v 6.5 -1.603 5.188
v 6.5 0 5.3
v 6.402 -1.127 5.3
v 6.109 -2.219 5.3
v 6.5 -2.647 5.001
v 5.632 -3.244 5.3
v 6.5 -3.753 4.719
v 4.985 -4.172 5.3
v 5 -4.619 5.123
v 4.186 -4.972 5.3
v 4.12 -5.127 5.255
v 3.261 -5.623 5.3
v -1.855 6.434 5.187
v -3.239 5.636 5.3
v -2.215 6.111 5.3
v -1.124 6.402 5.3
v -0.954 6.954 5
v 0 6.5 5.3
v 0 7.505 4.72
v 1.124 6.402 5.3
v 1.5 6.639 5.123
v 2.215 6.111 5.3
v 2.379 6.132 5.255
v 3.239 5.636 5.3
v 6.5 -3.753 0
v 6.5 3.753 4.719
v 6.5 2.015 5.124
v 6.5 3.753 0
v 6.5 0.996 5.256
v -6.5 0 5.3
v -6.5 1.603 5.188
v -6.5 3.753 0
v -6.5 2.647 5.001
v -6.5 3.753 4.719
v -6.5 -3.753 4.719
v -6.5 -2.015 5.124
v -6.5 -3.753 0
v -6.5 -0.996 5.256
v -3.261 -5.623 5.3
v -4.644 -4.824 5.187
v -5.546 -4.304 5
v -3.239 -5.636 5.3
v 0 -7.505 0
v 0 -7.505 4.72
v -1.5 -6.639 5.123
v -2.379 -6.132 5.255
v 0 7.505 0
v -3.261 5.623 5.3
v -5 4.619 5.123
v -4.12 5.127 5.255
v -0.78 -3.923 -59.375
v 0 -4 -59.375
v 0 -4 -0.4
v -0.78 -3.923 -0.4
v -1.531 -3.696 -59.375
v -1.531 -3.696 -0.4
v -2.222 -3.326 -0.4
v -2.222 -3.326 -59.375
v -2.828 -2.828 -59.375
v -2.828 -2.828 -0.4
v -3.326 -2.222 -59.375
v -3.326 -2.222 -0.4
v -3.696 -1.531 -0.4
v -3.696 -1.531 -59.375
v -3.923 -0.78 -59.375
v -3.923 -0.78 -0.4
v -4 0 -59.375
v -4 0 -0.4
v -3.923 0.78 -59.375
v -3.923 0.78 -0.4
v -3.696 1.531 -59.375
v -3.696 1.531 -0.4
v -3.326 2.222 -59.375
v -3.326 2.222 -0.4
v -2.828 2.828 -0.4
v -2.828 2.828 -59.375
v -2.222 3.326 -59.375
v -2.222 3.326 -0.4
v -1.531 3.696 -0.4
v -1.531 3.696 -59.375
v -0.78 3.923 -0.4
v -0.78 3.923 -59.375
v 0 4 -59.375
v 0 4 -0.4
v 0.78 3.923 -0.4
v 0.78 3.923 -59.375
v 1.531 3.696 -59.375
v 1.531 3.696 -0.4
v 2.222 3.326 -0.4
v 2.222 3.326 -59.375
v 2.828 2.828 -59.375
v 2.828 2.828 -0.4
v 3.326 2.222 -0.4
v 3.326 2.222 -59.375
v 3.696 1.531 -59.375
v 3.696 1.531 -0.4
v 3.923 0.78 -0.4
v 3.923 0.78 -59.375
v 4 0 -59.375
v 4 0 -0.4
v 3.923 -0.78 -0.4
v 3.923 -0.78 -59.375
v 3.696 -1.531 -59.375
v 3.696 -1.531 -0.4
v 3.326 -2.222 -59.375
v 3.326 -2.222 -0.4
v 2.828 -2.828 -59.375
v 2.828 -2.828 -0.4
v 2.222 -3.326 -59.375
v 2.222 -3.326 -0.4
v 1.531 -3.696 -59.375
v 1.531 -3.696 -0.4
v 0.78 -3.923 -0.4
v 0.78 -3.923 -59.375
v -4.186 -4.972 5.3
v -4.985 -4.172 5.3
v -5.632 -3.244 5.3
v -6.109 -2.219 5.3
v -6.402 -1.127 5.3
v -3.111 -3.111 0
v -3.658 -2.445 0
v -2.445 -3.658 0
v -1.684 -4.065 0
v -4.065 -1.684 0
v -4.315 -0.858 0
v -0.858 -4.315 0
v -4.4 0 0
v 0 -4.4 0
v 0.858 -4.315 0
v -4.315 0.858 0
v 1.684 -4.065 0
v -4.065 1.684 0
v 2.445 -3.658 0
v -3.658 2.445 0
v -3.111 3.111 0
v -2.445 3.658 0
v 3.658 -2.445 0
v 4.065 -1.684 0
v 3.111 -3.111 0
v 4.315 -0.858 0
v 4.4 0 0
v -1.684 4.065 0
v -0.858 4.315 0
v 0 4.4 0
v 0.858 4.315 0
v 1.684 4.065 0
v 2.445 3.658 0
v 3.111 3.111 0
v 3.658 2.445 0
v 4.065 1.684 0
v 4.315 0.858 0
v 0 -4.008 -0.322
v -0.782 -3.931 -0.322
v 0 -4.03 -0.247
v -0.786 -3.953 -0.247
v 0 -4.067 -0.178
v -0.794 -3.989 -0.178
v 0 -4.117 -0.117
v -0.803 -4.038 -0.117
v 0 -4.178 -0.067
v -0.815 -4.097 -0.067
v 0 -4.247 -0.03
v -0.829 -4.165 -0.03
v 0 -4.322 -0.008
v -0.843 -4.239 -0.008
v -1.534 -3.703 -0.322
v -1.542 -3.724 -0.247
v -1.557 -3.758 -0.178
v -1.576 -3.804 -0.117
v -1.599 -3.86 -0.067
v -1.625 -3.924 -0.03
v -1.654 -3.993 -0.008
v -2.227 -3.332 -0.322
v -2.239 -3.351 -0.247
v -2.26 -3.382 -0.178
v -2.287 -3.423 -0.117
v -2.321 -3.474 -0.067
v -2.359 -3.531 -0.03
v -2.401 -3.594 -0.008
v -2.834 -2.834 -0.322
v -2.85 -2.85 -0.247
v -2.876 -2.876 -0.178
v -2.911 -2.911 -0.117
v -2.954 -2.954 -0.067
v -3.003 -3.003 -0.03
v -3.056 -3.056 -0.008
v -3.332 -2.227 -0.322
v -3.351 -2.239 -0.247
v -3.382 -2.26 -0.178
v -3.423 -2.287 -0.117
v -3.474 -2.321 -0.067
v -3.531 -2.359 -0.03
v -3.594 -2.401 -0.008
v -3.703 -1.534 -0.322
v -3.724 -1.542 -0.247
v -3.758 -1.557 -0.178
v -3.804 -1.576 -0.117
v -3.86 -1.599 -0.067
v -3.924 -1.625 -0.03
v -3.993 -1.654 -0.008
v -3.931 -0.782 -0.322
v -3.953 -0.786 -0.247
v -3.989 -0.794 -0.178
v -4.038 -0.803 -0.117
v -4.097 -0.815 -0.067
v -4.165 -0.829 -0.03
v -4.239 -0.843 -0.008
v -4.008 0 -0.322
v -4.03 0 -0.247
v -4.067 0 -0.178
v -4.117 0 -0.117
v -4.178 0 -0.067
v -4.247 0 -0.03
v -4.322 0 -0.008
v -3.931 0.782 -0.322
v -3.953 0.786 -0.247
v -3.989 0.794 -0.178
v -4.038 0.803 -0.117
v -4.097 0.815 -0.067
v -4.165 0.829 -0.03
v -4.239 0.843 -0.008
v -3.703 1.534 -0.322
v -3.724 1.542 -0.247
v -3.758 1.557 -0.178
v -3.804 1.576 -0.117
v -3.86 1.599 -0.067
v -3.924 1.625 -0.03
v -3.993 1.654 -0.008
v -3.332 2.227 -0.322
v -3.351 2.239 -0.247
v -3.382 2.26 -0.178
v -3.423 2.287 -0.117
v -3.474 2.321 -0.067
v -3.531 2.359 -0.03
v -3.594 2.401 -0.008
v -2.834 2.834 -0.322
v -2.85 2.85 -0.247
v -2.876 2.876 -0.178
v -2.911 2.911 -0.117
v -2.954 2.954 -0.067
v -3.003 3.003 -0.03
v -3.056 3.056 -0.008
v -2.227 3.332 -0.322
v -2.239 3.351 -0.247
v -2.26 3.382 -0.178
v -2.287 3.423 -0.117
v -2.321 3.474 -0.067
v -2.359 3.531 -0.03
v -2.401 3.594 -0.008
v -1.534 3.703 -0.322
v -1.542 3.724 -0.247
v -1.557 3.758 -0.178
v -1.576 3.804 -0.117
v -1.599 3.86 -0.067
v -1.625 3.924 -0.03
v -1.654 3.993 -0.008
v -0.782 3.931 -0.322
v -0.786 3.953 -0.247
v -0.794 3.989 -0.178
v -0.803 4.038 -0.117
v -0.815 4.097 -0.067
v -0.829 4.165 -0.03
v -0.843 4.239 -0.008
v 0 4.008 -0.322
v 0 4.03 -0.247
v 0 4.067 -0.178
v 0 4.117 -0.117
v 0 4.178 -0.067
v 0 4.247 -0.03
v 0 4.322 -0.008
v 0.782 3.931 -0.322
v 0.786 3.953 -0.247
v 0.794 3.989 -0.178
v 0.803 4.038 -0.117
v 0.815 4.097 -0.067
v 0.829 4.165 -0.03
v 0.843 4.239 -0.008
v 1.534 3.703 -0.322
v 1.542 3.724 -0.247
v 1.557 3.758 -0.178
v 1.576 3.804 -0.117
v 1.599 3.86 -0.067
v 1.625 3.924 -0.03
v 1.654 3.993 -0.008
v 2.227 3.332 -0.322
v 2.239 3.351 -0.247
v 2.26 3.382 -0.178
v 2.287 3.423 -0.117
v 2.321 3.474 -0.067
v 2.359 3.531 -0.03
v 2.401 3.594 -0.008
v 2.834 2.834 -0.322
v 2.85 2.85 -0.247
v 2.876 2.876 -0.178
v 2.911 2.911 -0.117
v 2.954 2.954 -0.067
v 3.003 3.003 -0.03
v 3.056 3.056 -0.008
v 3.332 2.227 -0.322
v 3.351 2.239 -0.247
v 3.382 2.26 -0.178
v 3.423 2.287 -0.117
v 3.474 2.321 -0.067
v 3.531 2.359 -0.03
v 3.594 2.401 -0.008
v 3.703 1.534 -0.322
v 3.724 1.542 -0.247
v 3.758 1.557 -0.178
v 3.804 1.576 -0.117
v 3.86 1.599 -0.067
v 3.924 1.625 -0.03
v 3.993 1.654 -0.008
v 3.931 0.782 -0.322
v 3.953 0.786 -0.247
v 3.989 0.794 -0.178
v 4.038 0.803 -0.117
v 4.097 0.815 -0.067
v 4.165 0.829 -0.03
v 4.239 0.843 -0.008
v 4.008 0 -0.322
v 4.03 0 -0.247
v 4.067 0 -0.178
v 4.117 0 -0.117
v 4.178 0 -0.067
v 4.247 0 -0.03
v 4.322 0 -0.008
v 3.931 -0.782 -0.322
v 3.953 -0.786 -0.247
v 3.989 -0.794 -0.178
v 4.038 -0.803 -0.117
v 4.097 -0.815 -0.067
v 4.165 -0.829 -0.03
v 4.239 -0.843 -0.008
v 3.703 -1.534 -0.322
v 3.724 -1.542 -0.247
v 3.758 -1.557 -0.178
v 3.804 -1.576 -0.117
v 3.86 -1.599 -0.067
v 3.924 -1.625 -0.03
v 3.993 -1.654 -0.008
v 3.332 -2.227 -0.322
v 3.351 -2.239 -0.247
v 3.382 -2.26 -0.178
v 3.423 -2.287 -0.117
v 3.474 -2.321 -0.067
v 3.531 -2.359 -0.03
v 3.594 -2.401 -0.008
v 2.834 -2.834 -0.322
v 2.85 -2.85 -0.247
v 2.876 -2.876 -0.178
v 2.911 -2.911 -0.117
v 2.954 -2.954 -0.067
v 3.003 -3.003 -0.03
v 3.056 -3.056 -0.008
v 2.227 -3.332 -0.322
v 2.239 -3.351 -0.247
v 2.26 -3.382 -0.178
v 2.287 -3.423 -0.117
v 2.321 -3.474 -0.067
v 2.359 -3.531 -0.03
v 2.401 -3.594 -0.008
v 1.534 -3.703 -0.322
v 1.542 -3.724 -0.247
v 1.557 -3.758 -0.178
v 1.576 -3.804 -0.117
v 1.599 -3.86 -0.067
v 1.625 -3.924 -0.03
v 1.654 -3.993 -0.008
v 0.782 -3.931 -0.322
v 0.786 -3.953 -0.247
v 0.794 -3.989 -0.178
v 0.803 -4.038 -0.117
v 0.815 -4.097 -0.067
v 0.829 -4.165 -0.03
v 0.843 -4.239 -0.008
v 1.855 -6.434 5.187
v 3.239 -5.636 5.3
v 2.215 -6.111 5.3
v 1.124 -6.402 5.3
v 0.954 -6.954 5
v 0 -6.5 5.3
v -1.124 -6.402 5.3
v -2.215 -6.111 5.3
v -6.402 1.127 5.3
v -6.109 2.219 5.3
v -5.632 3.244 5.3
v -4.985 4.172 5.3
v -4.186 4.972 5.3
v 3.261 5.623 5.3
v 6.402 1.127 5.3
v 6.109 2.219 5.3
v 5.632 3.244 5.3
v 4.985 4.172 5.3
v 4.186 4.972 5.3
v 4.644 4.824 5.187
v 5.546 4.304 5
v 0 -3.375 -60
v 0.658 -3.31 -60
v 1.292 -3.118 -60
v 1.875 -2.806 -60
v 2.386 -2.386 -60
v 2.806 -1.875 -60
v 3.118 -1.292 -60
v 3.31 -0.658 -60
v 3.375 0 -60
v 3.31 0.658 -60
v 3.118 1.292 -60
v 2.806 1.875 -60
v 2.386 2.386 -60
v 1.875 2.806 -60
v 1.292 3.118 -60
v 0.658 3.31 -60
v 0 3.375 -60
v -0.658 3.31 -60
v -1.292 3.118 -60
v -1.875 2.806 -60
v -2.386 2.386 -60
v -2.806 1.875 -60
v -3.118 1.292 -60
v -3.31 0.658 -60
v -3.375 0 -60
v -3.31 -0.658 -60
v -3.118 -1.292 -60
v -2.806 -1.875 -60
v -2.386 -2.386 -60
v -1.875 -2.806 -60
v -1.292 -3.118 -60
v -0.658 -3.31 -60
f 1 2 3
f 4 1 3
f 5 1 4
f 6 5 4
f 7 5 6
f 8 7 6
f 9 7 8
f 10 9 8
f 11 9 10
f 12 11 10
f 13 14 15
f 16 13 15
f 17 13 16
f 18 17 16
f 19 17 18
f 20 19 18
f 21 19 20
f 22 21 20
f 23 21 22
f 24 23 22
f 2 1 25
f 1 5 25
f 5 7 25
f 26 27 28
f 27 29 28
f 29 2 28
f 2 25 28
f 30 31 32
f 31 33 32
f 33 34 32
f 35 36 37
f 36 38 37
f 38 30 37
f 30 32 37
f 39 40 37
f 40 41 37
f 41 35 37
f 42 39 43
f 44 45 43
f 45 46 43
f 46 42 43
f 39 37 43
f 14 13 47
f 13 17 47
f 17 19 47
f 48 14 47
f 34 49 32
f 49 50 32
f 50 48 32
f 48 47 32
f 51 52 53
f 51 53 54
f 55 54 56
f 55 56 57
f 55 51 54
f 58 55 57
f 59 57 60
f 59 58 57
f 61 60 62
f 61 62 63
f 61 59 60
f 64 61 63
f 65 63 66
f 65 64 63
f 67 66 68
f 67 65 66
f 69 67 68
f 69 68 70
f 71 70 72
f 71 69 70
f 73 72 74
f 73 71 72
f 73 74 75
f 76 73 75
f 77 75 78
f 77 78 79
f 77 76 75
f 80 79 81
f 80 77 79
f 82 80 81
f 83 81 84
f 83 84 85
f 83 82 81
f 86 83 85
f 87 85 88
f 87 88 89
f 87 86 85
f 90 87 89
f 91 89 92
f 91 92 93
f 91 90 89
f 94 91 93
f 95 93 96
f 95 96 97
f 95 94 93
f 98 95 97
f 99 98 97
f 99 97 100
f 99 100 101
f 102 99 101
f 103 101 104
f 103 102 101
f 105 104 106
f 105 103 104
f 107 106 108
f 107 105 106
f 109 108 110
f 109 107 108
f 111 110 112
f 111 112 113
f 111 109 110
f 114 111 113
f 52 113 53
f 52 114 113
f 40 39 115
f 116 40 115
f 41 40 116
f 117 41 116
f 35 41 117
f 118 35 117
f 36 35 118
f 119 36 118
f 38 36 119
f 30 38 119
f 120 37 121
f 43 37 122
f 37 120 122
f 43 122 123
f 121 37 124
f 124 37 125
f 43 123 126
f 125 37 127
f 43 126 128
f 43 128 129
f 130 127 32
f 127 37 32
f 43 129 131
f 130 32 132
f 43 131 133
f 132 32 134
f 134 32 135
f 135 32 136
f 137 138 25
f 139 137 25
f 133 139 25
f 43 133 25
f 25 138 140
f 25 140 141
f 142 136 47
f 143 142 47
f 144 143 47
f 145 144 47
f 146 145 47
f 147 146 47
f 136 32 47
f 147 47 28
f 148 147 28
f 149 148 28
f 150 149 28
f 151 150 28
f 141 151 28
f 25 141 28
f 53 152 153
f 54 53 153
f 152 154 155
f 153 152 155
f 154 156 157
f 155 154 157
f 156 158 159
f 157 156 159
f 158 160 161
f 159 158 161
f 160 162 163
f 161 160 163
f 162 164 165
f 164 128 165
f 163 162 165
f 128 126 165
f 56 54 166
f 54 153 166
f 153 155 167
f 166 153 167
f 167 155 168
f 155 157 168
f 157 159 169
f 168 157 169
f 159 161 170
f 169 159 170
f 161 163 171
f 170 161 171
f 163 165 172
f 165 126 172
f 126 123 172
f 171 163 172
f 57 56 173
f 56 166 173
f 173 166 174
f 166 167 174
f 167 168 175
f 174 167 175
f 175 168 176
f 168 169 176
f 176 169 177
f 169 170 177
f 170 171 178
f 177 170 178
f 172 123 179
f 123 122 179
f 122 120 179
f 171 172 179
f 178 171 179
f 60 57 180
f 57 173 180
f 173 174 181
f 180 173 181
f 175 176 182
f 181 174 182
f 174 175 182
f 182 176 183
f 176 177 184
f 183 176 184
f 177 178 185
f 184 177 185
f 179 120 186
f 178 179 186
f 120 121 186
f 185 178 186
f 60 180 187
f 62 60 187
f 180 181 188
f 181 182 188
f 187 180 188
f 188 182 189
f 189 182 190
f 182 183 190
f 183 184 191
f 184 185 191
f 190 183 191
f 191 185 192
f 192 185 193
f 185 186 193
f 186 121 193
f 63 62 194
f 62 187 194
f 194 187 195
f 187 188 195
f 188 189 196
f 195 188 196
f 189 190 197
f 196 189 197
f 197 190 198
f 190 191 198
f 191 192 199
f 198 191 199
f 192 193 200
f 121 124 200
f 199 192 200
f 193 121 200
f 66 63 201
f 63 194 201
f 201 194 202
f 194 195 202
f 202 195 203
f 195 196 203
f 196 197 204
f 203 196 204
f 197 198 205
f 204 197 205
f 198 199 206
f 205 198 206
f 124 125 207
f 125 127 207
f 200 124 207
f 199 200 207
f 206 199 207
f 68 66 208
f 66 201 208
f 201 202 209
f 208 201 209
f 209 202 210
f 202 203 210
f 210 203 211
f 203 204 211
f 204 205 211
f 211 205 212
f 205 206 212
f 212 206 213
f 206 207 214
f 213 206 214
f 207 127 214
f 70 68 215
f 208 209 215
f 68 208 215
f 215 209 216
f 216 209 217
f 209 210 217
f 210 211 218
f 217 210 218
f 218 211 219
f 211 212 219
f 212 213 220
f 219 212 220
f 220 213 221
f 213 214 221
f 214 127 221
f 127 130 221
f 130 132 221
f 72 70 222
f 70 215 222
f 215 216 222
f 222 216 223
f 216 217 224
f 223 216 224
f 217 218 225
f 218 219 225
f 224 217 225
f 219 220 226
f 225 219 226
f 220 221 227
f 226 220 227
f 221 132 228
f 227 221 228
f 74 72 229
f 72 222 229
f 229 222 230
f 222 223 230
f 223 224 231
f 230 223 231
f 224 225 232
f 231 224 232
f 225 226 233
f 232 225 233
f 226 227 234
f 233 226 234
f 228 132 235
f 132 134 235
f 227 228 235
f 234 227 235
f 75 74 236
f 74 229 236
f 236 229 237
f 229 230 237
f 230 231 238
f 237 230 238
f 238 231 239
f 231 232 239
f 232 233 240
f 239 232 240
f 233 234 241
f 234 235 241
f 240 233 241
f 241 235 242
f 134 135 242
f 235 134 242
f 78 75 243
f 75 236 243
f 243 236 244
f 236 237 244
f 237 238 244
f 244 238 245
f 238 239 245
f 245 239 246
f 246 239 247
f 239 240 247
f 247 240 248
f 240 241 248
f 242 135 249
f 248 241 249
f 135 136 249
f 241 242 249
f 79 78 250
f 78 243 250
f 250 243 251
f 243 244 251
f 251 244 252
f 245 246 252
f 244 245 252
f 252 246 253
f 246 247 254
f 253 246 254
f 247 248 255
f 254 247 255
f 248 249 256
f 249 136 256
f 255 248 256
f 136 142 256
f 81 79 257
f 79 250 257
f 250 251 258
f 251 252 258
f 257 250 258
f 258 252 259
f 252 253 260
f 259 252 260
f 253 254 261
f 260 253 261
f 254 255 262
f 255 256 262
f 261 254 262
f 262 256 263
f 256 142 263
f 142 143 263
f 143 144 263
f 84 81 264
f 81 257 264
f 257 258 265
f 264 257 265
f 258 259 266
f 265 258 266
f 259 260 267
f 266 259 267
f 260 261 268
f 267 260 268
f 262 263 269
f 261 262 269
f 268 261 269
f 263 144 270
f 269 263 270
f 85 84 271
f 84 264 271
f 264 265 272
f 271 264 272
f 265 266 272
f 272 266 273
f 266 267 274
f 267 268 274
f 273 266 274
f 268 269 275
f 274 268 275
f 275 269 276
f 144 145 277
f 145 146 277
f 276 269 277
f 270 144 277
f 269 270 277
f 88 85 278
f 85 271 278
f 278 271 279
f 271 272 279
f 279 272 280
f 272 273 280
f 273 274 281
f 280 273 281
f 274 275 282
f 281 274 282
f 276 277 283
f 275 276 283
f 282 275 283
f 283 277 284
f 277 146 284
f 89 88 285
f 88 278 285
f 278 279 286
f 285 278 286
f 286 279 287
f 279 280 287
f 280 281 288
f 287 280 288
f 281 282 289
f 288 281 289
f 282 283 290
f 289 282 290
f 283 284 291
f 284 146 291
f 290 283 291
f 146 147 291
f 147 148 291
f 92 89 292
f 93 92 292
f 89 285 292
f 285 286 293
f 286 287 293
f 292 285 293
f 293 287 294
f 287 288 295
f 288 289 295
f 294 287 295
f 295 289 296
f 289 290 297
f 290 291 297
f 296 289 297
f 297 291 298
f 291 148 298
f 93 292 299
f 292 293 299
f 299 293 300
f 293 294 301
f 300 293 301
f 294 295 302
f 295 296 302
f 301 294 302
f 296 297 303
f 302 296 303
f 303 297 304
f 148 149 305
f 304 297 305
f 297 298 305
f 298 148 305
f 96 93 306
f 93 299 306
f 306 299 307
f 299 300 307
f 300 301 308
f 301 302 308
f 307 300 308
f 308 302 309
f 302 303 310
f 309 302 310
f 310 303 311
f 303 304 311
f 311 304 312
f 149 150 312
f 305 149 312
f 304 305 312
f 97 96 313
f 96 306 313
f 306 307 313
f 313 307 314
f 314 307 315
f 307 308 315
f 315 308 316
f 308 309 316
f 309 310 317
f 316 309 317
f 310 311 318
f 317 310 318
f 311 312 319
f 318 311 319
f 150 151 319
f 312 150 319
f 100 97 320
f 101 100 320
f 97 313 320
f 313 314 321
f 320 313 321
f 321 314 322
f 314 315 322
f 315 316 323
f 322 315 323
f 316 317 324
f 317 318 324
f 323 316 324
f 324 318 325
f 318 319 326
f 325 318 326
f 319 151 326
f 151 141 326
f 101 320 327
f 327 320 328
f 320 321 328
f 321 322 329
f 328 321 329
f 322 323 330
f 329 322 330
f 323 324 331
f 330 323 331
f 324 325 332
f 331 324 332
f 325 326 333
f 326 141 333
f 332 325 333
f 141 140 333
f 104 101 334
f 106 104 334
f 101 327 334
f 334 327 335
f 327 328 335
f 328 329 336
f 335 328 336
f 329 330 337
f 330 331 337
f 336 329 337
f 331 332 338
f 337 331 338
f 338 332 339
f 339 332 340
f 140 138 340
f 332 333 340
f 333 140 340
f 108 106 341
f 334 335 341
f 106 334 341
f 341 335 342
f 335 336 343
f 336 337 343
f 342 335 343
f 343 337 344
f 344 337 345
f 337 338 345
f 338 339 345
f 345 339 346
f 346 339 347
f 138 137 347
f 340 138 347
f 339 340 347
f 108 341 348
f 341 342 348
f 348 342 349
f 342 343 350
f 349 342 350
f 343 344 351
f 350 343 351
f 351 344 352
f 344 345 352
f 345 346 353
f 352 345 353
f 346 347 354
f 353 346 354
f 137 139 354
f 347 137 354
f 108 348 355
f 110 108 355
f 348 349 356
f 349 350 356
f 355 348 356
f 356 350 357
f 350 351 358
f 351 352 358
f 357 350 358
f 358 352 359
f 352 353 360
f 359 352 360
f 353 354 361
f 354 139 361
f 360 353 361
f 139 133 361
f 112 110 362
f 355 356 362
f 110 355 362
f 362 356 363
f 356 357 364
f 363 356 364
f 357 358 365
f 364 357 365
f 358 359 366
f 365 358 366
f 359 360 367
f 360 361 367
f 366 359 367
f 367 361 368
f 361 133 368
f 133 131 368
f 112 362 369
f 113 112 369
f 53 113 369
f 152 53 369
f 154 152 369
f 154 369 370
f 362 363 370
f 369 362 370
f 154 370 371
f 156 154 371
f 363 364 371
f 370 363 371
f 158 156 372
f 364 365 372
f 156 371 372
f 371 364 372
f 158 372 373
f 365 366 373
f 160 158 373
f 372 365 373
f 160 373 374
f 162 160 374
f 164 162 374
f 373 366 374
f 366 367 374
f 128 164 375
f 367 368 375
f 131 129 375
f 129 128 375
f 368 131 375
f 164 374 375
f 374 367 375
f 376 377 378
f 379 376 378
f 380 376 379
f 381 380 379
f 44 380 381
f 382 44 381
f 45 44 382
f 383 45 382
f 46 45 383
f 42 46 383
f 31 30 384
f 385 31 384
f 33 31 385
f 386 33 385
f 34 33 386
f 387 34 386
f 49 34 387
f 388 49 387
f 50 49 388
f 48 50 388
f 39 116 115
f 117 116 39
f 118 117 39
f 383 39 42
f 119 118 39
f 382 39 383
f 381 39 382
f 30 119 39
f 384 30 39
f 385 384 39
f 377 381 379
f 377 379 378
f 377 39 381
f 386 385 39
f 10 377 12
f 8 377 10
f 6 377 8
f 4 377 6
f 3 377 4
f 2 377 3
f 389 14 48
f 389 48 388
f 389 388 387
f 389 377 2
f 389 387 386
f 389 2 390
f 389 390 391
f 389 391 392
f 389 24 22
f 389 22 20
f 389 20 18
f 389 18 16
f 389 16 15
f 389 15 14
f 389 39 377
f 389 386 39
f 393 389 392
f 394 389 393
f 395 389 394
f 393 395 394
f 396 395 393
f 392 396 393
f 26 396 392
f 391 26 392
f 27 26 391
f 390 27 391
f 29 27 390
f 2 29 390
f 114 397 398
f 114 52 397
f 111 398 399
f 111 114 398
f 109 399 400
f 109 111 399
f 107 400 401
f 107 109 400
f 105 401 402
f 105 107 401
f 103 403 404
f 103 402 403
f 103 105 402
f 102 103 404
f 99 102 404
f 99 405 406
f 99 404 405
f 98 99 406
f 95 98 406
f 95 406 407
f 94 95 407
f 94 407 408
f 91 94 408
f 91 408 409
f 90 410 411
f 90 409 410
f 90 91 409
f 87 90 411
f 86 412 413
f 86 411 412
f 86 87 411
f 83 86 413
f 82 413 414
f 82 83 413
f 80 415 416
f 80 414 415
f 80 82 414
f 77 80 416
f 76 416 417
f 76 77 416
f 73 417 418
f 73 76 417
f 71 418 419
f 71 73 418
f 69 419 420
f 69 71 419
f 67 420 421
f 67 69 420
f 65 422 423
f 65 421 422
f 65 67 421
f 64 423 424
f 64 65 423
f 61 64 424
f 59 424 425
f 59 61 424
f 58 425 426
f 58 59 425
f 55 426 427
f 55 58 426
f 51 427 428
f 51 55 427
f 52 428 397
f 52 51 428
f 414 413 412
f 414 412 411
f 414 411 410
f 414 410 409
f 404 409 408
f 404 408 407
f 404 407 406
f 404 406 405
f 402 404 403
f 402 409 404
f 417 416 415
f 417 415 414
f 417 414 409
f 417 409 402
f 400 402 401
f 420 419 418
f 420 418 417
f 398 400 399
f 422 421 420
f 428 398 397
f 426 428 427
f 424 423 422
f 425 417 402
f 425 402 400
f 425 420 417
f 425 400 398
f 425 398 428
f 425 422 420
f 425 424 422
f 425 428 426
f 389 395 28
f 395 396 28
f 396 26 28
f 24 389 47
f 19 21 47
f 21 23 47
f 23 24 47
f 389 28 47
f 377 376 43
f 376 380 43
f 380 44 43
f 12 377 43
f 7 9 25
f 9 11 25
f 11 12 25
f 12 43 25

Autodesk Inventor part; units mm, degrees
ref_plane "WorkPlane1" through (0, 0, 0) normal (0, 0, 1) x (1, 0, 0)
sketch "Sketch1" plane through (0, 0, 0) normal (0, 0, 1) x (1, 0, 0)
  point P0 (0, 0)
sketch "Sketch2" plane through (0, 0, 0) normal (0, 0, 1) x (1, 0, 0)
  line L0 (-6.5, 3.7529) -> (-6.5, -3.7529)
  line L1 (0, 7.5054) -> (-6.5, 3.7529)
  line L2 (6.5, 3.7529) -> (0, 7.5054)
  line L3 (6.5, -3.7529) -> (6.5, 3.7529)
  line L4 (0, -7.5054) -> (6.5, -3.7529)
  line L5 (-6.5, -3.7529) -> (0, -7.5054)
  circle A0 centre (0, 0) radius 6.5 construction
  dimension "d1" = 13
  dimension "d29" = 0
  dimension "d30" = 0
extrude "Extrusion1" add sketch "Sketch2" along normal blind 5.3
sketch "Sketch3" plane through (0, 0, 0) normal (1, 0, 0) x (0, 1, 0)
  line L0 (6.5, 5.3) -> (7.6054, 5.3)
  line L1 (7.6054, 4.6618) -> (6.5, 5.3)
  line L2 (7.6054, 5.3) -> (7.6054, 4.6618)
  line L3 (0, -1.06) -> (0, 6.36) projected
  line L4 (7.5054, 0) -> (7.5054, 5.3) projected
  dimension "d25" = 0.1
  dimension "d26" = 0
  dimension "d27" = 60
  dimension "d28" = 6.5
revolve "Revolution1" cut sketch "Sketch3" angle 360 about axis through (0, 0, -10) along (0, 0, 1)
sketch "Sketch4" plane through (0, 0, 0) normal (1, 0, 0) x (0, 1, 0)
  line L0 (0, -60) -> (0, 0)
  line L1 (-4, -60) -> (0, -60)
  line L2 (-4, 0) -> (-4, -60)
  line L3 (0, 0) -> (-4, 0)
  line L4 (0, -60) -> (0, 0)
  line L5 (-4.8, 0) -> (0.8, 0) projected
  line L6 (0, -72) -> (0, 12) projected
  dimension "d18" = 4
  dimension "d20" = 60
  dimension "d33" = 0
  dimension "d34" = 0
revolve "Revolution2" add sketch "Sketch4" angle 360 about axis through (0, 0, -60) along (0, 0, -1)
chamfer "Chamfer1" distance 0.625 angle 45 1 edges at (0, 4, -60)
fillet "Fillet1" radius 0.4 1 edges at (0, 4, 0)
thread "Thread1" size "M8x1.25" class "6g" standard "ISO Metric profile" length 57.5
ref_plane "MSC_PF1" through (0, 0, 0) normal (1, 0, 0) x (0, 1, 0)
ref_plane "MSC_PT1" through (0, 0, 0) normal (0, 0, -1) x (-1, 0, 0)
equation "\"d22\" = 0.5 * PTC"
equation "\"d23\" = 0.5 * PTC"
equation "\"d24\" = r"
equation "\"d1\" = ParS"
equation "\"d6\" = ParK"
equation "\"b\" = NLG - 2 * PTC"
equation "\"d28\" = 0.5 * ParS"
equation "\"d18\" = 0.5 * NND"
equation "\"d20\" = NLG"
equation "\"NND\" = 8"
equation "\"NLG\" = 60"
equation "\"PTC\" = 1.25"
equation "\"ParK\" = 5.3"
equation "\"ParS\" = 13"
equation "\"msp_es\" = 0.577367 * ParS"
equation "\"r\" = 0.4"
equation "\"THREADDIA\" = NND"
equation "\"K1\" = 3.45"
properties part number "DIN EN ISO 4018 - M8x60" material "Stainless Steel"
